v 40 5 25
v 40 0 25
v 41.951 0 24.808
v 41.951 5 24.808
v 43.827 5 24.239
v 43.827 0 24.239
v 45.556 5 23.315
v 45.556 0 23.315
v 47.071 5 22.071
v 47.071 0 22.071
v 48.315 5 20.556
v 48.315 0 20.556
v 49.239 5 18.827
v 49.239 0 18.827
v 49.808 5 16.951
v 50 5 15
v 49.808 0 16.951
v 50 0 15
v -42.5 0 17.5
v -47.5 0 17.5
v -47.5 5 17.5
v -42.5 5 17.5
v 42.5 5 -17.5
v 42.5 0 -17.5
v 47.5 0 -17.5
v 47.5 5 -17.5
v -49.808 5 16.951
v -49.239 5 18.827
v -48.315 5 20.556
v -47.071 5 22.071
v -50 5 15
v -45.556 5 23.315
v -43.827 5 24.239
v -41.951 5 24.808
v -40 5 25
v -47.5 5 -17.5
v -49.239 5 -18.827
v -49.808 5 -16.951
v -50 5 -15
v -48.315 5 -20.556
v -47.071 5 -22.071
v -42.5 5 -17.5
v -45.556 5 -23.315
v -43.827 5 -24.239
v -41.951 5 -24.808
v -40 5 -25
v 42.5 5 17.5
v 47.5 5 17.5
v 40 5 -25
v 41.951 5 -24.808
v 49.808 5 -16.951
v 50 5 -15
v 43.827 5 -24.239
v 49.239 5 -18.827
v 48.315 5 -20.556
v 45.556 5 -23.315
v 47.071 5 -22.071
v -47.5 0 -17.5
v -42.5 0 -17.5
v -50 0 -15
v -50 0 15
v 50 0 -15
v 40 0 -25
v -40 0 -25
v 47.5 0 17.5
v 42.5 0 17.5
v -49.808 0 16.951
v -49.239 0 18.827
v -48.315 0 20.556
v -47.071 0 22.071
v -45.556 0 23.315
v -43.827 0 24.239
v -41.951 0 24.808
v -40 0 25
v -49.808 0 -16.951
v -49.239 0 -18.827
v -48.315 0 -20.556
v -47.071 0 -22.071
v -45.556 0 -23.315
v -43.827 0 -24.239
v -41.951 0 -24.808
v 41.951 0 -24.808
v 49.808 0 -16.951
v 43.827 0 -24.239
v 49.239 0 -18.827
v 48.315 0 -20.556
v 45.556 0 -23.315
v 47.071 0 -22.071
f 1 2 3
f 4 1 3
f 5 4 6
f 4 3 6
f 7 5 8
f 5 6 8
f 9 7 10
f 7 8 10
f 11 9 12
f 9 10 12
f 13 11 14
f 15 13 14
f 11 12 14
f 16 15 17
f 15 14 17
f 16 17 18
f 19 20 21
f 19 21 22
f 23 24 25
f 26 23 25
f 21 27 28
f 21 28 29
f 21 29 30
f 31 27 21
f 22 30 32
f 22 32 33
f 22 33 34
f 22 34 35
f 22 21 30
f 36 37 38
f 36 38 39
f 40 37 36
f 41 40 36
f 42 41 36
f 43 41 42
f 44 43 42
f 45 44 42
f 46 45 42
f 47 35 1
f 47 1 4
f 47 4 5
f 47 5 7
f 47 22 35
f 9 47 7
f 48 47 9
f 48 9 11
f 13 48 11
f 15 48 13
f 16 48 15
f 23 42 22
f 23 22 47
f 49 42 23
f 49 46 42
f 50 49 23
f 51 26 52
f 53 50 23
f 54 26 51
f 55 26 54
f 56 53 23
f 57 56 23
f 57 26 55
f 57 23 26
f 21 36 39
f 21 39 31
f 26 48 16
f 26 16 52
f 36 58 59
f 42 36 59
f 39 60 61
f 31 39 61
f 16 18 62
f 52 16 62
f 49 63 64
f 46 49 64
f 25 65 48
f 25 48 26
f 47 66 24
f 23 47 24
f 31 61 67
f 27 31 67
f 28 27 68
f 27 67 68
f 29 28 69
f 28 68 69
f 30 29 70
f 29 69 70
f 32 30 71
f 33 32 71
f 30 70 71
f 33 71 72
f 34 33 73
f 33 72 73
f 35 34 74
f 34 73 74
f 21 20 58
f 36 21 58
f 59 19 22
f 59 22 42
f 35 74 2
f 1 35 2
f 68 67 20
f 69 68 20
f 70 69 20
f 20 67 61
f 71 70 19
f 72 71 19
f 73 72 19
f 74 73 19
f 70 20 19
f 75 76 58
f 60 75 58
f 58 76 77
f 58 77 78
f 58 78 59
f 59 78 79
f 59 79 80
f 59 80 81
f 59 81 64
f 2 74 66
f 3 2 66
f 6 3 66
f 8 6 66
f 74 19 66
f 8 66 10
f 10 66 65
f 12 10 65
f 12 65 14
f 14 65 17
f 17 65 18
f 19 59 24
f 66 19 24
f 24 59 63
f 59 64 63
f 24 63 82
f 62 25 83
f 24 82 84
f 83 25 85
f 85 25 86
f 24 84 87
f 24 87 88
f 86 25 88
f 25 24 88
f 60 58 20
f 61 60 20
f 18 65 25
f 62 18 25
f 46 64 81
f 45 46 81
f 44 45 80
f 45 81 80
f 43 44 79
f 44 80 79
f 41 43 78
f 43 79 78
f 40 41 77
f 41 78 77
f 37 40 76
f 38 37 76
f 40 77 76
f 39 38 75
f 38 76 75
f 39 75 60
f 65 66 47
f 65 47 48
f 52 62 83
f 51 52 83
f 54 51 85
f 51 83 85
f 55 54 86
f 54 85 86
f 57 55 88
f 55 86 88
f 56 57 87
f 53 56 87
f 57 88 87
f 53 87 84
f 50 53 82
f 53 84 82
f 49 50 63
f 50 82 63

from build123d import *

# Parameters (mm, degrees)
CROQUIS1_W              = 5
CROQUIS1_H              = 35
SALIENTE_EXTRUIR2_DEPTH = 5


with BuildPart() as part:
    # Croquis1 → Saliente-Extruir2 (new body)
    with BuildSketch(Plane(origin=(0, 0, 0), x_dir=(1, 0, 0), z_dir=(0, 1, 0))):
        with BuildLine():
            Line((-40, -25), (40, -25))
            ThreePointArc((40, -25), (47.071067812, -22.071067812), (50, -15))
            Line((50, -15), (50, 15))
            ThreePointArc((50, 15), (47.071067812, 22.071067812), (40, 25))
            Line((40, 25), (-40, 25))
            ThreePointArc((-40, 25), (-47.071067812, 22.071067812), (-50, 15))
            Line((-50, 15), (-50, -15))
            ThreePointArc((-50, -15), (-47.071067812, -22.071067812), (-40, -25))
        make_face()
        with Locations((-45, 0)):
            Rectangle(CROQUIS1_W, CROQUIS1_H, mode=Mode.SUBTRACT)
        with Locations((45, 0)):
            Rectangle(CROQUIS1_W, CROQUIS1_H, mode=Mode.SUBTRACT)
    extrude(amount=SALIENTE_EXTRUIR2_DEPTH)


solid = part.part
